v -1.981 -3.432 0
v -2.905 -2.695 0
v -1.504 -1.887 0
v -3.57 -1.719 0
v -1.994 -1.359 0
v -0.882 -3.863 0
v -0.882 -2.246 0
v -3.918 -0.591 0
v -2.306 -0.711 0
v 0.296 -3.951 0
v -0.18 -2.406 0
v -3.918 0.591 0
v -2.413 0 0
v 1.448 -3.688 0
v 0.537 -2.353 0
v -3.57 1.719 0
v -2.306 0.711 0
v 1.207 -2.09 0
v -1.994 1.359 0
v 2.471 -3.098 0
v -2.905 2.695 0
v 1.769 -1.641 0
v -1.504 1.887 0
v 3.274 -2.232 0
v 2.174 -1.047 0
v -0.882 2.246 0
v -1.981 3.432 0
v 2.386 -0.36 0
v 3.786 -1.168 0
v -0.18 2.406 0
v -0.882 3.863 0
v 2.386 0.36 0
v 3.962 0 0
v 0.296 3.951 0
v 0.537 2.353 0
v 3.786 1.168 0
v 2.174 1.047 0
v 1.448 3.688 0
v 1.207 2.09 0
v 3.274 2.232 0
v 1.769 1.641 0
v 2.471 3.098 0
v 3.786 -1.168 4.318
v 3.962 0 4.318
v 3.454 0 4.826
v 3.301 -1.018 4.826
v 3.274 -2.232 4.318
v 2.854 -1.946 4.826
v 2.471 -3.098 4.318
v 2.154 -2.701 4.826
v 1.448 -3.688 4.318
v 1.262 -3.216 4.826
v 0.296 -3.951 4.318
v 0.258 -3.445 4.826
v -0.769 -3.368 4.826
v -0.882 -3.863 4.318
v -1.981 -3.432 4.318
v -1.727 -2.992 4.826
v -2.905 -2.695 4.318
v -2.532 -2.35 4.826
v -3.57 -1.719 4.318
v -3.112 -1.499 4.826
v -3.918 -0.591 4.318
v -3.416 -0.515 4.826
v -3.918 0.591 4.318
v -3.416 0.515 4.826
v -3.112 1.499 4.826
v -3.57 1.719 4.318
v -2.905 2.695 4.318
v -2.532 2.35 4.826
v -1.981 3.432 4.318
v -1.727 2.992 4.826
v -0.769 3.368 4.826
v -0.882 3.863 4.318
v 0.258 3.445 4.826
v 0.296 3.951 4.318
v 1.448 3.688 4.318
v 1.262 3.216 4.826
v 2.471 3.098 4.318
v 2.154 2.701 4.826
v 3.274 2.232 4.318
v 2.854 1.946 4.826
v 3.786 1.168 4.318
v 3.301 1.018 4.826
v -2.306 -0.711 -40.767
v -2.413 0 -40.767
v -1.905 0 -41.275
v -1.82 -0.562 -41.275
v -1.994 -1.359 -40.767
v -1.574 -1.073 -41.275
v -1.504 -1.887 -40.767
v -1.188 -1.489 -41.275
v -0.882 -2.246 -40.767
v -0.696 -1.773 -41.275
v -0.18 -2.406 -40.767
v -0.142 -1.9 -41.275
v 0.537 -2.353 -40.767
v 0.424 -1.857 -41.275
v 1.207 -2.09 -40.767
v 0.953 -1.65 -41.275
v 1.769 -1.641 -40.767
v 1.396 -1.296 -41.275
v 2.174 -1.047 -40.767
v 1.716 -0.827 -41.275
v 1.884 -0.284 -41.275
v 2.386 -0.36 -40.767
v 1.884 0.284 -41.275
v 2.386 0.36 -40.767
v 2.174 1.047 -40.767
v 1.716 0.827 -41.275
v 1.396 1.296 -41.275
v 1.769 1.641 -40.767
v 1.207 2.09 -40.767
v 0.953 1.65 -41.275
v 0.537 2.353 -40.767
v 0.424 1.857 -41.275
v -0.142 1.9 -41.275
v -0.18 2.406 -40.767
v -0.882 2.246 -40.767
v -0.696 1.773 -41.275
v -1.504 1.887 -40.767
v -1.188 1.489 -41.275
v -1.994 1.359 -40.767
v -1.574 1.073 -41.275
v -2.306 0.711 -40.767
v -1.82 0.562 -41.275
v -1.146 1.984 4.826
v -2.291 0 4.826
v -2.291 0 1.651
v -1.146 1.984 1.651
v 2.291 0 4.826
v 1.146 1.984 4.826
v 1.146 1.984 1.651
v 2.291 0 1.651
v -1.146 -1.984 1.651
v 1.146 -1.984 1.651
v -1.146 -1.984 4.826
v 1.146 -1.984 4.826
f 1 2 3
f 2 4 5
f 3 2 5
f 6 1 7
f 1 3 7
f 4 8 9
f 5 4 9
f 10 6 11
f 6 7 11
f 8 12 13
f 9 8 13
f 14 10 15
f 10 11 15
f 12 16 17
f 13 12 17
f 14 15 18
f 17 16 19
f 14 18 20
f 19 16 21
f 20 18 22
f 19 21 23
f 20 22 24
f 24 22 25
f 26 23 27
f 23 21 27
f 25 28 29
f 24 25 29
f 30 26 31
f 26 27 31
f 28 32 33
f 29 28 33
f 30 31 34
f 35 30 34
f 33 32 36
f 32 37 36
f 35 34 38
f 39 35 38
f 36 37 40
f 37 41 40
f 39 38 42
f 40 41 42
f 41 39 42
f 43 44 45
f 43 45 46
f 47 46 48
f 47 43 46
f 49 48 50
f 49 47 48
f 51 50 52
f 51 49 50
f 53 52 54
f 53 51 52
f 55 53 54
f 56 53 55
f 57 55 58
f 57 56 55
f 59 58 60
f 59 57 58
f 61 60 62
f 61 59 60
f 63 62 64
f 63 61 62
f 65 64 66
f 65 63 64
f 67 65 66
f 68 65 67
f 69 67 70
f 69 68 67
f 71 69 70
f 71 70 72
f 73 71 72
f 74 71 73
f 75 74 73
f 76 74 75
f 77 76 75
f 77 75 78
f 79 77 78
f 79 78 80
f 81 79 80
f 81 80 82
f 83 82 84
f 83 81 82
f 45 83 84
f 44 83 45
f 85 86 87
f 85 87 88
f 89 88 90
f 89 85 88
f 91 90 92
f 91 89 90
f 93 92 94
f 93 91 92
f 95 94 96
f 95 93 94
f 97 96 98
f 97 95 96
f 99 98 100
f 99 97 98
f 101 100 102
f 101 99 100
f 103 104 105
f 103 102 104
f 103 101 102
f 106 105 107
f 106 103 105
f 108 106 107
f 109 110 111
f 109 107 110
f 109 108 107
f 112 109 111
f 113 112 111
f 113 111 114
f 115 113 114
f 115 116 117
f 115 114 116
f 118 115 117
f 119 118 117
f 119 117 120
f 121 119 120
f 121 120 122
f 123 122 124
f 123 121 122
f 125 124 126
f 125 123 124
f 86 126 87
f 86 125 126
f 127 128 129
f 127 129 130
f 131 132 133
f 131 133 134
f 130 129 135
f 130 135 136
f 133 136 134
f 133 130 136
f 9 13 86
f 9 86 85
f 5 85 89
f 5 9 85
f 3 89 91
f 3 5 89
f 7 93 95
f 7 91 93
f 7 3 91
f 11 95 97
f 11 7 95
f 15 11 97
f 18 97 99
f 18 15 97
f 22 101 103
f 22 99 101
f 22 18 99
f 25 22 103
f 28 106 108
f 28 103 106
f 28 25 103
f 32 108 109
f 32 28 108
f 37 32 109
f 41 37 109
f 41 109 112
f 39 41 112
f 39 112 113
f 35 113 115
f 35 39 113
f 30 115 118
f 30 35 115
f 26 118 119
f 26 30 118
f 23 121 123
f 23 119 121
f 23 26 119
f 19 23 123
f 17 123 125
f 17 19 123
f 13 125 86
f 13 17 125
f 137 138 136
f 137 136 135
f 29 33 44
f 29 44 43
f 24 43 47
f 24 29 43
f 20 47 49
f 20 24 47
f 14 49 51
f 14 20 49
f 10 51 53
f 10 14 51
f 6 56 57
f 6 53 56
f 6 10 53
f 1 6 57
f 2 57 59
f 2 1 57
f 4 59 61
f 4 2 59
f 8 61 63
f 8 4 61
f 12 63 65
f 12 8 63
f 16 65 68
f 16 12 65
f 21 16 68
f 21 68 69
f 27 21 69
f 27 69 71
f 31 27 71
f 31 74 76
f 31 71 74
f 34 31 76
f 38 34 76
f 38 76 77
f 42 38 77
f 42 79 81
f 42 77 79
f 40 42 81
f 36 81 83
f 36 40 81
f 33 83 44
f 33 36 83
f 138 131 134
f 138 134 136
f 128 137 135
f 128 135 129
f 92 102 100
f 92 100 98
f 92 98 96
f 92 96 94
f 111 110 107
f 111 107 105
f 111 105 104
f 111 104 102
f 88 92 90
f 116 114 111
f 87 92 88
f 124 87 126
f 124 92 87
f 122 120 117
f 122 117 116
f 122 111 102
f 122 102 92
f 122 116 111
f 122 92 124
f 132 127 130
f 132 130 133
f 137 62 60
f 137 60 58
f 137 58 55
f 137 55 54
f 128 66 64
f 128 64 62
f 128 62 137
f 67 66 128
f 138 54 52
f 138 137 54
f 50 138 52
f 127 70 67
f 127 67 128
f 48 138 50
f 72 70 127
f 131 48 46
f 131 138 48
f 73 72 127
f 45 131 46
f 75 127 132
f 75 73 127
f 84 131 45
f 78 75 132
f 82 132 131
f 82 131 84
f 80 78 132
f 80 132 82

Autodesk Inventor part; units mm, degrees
ref_plane "YZ Plane" through (0, 0, 0) normal (1, 0, 0) x (0, 1, 0)
ref_plane "XZ Plane" through (0, 0, 0) normal (0, 1, 0) x (-1, 0, 0)
ref_plane "XY Plane" through (0, 0, 0) normal (0, 0, 1) x (1, 0, 0)
sketch "Sketch1" plane through (0, 0, 0) normal (0, 0, 1) x (1, 0, 0)
  circle A0 centre (0, 0) radius 3.9624
  dimension "d0" = 7.9248
extrude "Extrusion1" add sketch "Sketch1" along normal blind 4.826
sketch "Sketch2" plane through (0, 0, 0) normal (0, 0, -1) x (-1, 0, 0)
  circle A0 centre (0, 0) radius 3.9624 projected
  circle A1 centre (0, 0) radius 2.413
  dimension "d3" = 4.826
extrude "Extrusion2" add sketch "Sketch2" along normal blind 41.275 contours A1
sketch "Sketch3" plane through (0, 0, 4.826) normal (0, 0, 1) x (1, 0, 0)
  circle A0 centre (0, 0) radius 3.9624 projected
  line L0 (-1.1457, 1.9844) -> (1.1457, 1.9844)
  line L1 (1.1457, 1.9844) -> (2.2914, 0)
  line L2 (2.2914, 0) -> (1.1457, -1.9844)
  line L3 (1.1457, -1.9844) -> (-1.1457, -1.9844)
  line L4 (-1.1457, -1.9844) -> (-2.2914, 0)
  line L5 (-2.2914, 0) -> (-1.1457, 1.9844)
  dimension "d6" = 3.9688
extrude "Extrusion3" cut sketch "Sketch3" against normal blind 3.175 contours L0 L1 L2 L3 L4 L5
thread "Thread1" size "10-32 UNF" class "2A" standard "ANSI Unified Screw Threads" length 25.4
chamfer "Chamfer1" distance 0.508 angle 45 1 edges at (2.413, 0, -41.275)
chamfer "Chamfer2" distance 0.508 angle 45 1 edges at (-3.9624, 0, 4.826)
properties part number "10-32 x1625" material "Steel"
